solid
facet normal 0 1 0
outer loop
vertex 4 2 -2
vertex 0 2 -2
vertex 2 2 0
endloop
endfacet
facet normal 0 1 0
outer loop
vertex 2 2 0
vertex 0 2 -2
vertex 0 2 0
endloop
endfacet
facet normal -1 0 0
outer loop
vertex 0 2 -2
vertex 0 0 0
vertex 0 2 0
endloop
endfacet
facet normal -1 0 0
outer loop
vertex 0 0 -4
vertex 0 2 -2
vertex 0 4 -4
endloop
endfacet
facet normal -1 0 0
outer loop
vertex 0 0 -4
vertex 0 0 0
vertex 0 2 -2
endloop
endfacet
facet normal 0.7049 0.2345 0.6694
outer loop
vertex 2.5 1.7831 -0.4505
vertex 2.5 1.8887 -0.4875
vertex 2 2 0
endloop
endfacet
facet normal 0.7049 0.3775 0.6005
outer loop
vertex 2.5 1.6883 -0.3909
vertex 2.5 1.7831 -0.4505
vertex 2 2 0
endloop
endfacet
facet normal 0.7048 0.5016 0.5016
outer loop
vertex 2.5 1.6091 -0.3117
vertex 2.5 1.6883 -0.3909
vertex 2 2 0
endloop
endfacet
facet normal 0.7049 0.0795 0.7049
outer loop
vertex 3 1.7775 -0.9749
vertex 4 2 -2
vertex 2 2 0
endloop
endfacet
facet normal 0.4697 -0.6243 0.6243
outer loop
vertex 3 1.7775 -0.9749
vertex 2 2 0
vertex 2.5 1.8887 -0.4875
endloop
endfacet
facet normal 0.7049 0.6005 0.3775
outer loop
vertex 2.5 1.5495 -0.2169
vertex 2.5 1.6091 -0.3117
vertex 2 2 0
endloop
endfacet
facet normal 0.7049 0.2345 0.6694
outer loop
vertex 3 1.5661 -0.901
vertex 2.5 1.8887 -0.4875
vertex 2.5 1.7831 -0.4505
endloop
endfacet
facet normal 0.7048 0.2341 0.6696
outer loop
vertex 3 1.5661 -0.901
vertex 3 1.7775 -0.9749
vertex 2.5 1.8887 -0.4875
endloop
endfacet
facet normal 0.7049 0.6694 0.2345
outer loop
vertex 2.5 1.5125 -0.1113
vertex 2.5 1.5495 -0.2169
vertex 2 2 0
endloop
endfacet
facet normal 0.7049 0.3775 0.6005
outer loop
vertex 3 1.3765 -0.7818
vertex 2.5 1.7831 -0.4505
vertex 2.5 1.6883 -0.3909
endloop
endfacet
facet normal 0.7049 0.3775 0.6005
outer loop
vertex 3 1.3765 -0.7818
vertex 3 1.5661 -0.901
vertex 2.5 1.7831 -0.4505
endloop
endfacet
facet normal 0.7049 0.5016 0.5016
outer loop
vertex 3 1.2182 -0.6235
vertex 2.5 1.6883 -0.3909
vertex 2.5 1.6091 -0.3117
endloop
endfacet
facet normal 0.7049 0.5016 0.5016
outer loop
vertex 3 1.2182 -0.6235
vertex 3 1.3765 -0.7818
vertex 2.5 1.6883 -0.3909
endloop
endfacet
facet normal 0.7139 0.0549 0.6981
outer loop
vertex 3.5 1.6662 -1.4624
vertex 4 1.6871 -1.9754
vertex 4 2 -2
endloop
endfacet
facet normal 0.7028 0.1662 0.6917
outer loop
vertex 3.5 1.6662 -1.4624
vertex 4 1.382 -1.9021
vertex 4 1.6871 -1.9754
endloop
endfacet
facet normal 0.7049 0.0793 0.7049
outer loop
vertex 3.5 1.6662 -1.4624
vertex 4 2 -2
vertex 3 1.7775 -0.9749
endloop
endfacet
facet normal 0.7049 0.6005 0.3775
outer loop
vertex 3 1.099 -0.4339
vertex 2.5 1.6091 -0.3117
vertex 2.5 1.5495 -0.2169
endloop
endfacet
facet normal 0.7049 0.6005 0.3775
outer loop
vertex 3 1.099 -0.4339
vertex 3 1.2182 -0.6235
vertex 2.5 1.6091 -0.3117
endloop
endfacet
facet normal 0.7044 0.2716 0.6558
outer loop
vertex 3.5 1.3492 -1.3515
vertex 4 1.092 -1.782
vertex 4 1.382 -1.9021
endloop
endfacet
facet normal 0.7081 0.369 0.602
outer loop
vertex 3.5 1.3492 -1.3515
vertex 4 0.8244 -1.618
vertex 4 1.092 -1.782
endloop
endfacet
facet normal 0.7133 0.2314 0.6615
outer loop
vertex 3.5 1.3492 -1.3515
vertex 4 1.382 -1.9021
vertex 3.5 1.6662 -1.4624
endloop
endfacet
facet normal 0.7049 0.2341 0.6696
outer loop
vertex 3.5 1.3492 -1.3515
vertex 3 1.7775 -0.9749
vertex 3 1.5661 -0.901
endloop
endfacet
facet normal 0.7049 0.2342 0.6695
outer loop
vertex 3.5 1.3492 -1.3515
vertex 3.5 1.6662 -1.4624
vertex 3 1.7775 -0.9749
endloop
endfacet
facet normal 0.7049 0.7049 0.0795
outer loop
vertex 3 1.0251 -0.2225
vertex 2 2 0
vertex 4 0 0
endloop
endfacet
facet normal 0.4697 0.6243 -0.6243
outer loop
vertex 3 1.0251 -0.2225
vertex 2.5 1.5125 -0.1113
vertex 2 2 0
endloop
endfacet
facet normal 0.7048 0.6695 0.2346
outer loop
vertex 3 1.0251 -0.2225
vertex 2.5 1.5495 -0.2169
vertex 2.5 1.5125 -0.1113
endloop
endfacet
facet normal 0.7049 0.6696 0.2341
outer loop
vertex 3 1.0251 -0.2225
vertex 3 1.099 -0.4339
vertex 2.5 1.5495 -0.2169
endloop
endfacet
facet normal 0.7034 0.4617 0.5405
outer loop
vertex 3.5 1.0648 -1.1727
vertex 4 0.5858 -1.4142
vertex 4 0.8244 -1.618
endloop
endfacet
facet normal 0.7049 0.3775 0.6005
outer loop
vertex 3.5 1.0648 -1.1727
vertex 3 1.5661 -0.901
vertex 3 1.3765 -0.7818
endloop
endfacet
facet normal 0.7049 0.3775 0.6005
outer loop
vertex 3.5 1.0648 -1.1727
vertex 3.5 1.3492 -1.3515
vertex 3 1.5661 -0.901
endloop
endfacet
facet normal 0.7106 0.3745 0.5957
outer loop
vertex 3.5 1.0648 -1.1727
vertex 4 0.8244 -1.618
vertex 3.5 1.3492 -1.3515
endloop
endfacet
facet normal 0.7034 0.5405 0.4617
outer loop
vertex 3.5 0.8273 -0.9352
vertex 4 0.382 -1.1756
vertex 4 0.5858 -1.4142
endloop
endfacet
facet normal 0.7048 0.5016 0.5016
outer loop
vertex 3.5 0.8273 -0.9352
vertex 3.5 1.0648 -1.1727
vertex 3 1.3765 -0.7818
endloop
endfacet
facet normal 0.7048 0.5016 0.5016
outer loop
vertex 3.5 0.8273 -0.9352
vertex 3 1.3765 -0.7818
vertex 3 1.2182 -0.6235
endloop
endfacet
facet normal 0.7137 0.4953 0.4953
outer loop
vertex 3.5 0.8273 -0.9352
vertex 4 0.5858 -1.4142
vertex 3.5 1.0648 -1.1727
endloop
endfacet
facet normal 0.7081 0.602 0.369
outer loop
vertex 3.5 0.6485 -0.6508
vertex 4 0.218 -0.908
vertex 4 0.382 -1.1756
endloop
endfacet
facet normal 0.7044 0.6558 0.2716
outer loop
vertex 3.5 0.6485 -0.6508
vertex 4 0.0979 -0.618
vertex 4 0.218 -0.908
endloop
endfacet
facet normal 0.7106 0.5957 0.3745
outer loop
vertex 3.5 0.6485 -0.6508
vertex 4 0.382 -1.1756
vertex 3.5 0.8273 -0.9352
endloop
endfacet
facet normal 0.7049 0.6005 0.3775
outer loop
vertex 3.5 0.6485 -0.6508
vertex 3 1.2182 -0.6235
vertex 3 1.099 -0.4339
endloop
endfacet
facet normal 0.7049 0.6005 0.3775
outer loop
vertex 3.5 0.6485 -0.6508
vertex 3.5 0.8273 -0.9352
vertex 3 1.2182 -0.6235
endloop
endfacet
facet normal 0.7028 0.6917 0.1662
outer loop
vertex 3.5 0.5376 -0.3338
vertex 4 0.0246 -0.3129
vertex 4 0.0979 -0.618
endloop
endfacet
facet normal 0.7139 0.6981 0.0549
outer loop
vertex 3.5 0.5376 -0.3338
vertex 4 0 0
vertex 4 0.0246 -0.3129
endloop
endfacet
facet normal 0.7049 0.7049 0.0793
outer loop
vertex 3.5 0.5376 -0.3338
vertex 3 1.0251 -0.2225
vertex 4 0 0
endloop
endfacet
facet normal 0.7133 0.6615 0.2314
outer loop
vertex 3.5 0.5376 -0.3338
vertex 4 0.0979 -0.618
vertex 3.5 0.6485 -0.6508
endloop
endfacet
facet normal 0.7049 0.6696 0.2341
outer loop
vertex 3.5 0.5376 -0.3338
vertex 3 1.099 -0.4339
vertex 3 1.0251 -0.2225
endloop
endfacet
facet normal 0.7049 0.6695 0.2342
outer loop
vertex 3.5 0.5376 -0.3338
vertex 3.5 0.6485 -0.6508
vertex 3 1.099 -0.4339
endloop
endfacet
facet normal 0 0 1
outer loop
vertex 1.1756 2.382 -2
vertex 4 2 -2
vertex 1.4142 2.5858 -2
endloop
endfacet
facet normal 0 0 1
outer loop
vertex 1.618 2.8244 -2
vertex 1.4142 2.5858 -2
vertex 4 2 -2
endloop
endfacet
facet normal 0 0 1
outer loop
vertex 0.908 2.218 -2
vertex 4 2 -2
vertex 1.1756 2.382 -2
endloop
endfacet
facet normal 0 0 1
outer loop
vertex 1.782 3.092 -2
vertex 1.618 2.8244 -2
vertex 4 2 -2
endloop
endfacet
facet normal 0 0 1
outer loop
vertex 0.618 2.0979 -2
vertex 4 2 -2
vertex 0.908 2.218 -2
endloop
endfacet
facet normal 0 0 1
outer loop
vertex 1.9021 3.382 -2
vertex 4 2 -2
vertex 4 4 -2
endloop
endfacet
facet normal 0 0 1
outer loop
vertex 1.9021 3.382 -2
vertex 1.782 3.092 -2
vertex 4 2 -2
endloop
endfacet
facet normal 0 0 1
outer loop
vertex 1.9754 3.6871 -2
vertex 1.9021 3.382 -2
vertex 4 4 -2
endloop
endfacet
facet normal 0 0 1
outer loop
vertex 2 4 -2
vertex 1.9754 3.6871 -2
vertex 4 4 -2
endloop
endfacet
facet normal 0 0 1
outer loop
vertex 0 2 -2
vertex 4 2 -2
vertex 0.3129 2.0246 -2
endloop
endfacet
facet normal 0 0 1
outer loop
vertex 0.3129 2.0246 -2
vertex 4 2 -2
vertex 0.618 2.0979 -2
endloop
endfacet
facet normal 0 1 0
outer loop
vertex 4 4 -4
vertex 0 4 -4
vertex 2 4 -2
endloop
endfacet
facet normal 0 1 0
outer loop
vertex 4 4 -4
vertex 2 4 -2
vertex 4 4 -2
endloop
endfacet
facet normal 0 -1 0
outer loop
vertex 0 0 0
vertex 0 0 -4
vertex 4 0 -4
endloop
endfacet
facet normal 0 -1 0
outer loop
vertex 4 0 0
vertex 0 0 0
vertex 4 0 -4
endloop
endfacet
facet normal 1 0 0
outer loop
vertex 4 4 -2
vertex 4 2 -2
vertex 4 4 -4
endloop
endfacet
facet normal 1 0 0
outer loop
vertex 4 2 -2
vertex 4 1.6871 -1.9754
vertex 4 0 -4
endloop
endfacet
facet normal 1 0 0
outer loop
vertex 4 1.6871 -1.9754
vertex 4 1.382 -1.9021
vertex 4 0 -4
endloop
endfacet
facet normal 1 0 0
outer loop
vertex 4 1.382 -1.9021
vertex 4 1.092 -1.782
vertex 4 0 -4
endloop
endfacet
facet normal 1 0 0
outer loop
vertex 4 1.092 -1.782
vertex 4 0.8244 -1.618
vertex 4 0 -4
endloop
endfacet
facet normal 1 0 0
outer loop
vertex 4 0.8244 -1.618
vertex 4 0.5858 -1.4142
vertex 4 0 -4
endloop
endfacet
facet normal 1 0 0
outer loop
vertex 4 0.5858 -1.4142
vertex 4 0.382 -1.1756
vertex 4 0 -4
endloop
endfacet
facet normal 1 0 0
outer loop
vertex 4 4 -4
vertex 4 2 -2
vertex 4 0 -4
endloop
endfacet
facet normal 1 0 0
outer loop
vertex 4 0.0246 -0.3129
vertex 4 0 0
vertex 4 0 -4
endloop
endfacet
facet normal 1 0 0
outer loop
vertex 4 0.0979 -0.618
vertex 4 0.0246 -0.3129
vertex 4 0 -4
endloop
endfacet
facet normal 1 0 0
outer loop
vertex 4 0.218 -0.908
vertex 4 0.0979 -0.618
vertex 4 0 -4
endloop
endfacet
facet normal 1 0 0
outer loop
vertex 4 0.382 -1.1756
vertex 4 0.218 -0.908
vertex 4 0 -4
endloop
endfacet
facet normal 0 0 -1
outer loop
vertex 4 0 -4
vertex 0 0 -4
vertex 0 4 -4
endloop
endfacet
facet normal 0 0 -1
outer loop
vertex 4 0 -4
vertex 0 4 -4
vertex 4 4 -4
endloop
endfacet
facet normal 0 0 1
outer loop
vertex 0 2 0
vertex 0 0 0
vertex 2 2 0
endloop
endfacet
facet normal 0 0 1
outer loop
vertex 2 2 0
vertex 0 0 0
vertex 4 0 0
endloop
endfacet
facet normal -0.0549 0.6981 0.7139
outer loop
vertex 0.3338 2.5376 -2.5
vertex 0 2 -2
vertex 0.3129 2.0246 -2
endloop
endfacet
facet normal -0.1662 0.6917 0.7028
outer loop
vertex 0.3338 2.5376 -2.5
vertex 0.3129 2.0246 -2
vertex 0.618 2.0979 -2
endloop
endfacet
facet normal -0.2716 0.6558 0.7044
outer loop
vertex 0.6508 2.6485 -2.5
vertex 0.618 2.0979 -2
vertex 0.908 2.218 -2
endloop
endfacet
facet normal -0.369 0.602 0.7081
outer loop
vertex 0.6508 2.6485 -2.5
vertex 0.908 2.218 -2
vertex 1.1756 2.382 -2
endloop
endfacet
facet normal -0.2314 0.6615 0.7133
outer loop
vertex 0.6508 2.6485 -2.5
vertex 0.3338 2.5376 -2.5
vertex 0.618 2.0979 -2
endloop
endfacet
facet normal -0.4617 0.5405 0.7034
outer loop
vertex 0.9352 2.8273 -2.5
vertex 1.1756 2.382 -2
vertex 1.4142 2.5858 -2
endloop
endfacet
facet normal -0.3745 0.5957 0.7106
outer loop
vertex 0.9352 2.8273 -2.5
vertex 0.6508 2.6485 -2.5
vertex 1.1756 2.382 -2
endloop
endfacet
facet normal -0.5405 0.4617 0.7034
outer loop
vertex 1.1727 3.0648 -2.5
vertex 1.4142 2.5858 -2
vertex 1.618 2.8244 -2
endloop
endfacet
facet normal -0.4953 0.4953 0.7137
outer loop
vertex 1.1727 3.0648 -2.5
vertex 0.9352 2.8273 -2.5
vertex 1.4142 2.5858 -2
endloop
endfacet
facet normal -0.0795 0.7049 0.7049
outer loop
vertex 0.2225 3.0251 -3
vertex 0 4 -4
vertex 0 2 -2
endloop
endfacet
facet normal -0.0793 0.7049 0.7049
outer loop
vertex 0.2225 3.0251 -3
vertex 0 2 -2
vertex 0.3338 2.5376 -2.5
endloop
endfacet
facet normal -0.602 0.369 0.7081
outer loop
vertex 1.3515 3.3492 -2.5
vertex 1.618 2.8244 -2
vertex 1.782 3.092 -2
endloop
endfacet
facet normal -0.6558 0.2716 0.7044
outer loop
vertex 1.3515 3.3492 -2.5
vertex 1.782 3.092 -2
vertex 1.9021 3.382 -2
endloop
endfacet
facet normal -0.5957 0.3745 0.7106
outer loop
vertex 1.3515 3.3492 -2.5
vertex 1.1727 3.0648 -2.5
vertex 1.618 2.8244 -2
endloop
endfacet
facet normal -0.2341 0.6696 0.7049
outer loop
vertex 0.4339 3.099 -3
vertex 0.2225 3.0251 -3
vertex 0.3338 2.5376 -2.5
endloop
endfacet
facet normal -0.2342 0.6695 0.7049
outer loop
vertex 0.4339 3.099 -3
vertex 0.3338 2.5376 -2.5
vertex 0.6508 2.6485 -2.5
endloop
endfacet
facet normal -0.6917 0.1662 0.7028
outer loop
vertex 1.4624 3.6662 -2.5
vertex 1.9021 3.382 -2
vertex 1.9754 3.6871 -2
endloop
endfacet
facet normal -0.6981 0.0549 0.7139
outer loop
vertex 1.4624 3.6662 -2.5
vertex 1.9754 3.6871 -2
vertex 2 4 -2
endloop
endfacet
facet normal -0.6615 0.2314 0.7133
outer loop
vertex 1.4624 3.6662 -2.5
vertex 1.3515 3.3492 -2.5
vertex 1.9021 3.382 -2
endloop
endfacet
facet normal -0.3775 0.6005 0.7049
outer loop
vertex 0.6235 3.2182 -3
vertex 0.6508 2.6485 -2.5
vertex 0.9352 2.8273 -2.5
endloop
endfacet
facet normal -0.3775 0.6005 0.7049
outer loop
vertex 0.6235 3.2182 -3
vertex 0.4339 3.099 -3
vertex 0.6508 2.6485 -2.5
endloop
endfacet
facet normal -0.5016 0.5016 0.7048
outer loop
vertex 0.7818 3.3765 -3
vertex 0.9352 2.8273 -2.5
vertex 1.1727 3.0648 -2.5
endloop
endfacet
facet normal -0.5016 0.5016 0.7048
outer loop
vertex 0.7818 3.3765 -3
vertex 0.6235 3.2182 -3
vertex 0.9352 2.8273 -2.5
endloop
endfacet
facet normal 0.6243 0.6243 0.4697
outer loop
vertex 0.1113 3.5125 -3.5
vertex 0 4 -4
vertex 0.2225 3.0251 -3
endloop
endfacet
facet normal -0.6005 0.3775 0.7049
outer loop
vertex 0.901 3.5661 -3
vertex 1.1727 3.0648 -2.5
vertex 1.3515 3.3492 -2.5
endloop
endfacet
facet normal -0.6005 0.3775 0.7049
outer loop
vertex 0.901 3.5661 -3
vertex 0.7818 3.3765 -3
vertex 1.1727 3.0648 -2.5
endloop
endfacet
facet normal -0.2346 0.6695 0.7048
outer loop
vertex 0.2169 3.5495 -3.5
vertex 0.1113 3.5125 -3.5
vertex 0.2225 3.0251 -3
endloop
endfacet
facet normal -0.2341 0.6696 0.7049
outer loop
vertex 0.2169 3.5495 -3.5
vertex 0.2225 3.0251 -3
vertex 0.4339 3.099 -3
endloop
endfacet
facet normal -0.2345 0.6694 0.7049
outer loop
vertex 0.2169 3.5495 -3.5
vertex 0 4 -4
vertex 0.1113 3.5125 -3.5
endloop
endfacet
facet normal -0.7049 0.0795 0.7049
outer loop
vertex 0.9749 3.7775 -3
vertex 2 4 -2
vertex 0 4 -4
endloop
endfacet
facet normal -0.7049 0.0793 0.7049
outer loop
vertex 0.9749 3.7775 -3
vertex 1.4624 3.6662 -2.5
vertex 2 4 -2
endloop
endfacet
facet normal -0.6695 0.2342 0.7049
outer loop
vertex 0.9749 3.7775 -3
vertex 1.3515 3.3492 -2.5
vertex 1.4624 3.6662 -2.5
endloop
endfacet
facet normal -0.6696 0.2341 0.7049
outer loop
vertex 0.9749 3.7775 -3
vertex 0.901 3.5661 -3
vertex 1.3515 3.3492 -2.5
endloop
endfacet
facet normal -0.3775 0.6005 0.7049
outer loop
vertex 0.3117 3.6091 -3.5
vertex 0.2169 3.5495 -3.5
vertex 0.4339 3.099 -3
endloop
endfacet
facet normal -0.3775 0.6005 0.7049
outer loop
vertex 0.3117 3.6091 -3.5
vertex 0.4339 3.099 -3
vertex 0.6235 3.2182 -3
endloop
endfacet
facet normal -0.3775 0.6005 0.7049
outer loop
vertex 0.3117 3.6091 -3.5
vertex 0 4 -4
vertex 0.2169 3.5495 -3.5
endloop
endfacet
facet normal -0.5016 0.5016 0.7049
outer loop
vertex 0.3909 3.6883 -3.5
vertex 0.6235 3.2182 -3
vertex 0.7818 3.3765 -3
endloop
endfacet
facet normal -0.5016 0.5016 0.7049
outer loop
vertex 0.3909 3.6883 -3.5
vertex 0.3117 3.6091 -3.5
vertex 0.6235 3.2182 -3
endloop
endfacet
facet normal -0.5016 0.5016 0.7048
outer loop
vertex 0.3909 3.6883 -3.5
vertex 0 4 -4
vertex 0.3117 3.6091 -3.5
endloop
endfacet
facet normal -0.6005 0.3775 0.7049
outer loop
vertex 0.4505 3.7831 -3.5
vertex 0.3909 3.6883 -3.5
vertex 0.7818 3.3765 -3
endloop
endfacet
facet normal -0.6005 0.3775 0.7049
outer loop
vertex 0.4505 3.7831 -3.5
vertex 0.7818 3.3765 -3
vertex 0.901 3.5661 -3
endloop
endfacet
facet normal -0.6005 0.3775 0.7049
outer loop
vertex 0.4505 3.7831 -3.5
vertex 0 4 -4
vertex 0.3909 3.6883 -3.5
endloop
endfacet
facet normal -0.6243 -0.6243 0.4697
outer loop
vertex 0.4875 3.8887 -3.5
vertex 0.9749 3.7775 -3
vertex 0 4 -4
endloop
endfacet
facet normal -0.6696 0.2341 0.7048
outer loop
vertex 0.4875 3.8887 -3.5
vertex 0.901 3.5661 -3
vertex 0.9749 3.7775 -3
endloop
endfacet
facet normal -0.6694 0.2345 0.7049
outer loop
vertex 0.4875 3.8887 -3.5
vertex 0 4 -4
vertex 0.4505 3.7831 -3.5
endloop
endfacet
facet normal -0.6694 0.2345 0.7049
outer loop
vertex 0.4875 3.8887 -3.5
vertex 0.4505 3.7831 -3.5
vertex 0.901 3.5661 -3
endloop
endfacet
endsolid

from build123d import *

# Parameters (mm, degrees)
SKETCH1_W           = 4
SKETCH1_H           = 4
BOSS_EXTRUDE1_DEPTH = 4
SKETCH2_W           = 2
SKETCH2_H           = 2
CUT_EXTRUDE1_DEPTH  = 4


with BuildPart() as part:
    # Sketch1 → Boss-Extrude1 (new body)
    with BuildSketch(Plane(origin=(0, 0, 0), x_dir=(1, 0, 0), z_dir=(0, 1, 0))):
        with Locations((2, 2)):
            Rectangle(SKETCH1_W, SKETCH1_H)
    extrude(amount=BOSS_EXTRUDE1_DEPTH)

    # Sketch2 → Cut-Extrude1 (cut)
    with BuildSketch(Plane.ZY):
        with Locations((-1, 3)):
            Rectangle(SKETCH2_W, SKETCH2_H)
    extrude(amount=-CUT_EXTRUDE1_DEPTH, mode=Mode.SUBTRACT)

    # Sketch3 → Cut-Revolve1 (revolve, cut)
    with BuildSketch(Plane.ZY):
        Polygon((-2, 2), (-4, 4), (-2, 4), align=None)
    revolve(axis=Axis((0, 4, -4), (0, 0, 1)), mode=Mode.SUBTRACT)

    # Sketch4 → Cut-Revolve2 (revolve, cut)
    with BuildSketch(Plane.XY):
        Polygon((2, 2), (4, 0), (4, 2), align=None)
    revolve(axis=Axis((4, 2, 0), (-1, 0, 0)), mode=Mode.SUBTRACT)


solid = part.part
